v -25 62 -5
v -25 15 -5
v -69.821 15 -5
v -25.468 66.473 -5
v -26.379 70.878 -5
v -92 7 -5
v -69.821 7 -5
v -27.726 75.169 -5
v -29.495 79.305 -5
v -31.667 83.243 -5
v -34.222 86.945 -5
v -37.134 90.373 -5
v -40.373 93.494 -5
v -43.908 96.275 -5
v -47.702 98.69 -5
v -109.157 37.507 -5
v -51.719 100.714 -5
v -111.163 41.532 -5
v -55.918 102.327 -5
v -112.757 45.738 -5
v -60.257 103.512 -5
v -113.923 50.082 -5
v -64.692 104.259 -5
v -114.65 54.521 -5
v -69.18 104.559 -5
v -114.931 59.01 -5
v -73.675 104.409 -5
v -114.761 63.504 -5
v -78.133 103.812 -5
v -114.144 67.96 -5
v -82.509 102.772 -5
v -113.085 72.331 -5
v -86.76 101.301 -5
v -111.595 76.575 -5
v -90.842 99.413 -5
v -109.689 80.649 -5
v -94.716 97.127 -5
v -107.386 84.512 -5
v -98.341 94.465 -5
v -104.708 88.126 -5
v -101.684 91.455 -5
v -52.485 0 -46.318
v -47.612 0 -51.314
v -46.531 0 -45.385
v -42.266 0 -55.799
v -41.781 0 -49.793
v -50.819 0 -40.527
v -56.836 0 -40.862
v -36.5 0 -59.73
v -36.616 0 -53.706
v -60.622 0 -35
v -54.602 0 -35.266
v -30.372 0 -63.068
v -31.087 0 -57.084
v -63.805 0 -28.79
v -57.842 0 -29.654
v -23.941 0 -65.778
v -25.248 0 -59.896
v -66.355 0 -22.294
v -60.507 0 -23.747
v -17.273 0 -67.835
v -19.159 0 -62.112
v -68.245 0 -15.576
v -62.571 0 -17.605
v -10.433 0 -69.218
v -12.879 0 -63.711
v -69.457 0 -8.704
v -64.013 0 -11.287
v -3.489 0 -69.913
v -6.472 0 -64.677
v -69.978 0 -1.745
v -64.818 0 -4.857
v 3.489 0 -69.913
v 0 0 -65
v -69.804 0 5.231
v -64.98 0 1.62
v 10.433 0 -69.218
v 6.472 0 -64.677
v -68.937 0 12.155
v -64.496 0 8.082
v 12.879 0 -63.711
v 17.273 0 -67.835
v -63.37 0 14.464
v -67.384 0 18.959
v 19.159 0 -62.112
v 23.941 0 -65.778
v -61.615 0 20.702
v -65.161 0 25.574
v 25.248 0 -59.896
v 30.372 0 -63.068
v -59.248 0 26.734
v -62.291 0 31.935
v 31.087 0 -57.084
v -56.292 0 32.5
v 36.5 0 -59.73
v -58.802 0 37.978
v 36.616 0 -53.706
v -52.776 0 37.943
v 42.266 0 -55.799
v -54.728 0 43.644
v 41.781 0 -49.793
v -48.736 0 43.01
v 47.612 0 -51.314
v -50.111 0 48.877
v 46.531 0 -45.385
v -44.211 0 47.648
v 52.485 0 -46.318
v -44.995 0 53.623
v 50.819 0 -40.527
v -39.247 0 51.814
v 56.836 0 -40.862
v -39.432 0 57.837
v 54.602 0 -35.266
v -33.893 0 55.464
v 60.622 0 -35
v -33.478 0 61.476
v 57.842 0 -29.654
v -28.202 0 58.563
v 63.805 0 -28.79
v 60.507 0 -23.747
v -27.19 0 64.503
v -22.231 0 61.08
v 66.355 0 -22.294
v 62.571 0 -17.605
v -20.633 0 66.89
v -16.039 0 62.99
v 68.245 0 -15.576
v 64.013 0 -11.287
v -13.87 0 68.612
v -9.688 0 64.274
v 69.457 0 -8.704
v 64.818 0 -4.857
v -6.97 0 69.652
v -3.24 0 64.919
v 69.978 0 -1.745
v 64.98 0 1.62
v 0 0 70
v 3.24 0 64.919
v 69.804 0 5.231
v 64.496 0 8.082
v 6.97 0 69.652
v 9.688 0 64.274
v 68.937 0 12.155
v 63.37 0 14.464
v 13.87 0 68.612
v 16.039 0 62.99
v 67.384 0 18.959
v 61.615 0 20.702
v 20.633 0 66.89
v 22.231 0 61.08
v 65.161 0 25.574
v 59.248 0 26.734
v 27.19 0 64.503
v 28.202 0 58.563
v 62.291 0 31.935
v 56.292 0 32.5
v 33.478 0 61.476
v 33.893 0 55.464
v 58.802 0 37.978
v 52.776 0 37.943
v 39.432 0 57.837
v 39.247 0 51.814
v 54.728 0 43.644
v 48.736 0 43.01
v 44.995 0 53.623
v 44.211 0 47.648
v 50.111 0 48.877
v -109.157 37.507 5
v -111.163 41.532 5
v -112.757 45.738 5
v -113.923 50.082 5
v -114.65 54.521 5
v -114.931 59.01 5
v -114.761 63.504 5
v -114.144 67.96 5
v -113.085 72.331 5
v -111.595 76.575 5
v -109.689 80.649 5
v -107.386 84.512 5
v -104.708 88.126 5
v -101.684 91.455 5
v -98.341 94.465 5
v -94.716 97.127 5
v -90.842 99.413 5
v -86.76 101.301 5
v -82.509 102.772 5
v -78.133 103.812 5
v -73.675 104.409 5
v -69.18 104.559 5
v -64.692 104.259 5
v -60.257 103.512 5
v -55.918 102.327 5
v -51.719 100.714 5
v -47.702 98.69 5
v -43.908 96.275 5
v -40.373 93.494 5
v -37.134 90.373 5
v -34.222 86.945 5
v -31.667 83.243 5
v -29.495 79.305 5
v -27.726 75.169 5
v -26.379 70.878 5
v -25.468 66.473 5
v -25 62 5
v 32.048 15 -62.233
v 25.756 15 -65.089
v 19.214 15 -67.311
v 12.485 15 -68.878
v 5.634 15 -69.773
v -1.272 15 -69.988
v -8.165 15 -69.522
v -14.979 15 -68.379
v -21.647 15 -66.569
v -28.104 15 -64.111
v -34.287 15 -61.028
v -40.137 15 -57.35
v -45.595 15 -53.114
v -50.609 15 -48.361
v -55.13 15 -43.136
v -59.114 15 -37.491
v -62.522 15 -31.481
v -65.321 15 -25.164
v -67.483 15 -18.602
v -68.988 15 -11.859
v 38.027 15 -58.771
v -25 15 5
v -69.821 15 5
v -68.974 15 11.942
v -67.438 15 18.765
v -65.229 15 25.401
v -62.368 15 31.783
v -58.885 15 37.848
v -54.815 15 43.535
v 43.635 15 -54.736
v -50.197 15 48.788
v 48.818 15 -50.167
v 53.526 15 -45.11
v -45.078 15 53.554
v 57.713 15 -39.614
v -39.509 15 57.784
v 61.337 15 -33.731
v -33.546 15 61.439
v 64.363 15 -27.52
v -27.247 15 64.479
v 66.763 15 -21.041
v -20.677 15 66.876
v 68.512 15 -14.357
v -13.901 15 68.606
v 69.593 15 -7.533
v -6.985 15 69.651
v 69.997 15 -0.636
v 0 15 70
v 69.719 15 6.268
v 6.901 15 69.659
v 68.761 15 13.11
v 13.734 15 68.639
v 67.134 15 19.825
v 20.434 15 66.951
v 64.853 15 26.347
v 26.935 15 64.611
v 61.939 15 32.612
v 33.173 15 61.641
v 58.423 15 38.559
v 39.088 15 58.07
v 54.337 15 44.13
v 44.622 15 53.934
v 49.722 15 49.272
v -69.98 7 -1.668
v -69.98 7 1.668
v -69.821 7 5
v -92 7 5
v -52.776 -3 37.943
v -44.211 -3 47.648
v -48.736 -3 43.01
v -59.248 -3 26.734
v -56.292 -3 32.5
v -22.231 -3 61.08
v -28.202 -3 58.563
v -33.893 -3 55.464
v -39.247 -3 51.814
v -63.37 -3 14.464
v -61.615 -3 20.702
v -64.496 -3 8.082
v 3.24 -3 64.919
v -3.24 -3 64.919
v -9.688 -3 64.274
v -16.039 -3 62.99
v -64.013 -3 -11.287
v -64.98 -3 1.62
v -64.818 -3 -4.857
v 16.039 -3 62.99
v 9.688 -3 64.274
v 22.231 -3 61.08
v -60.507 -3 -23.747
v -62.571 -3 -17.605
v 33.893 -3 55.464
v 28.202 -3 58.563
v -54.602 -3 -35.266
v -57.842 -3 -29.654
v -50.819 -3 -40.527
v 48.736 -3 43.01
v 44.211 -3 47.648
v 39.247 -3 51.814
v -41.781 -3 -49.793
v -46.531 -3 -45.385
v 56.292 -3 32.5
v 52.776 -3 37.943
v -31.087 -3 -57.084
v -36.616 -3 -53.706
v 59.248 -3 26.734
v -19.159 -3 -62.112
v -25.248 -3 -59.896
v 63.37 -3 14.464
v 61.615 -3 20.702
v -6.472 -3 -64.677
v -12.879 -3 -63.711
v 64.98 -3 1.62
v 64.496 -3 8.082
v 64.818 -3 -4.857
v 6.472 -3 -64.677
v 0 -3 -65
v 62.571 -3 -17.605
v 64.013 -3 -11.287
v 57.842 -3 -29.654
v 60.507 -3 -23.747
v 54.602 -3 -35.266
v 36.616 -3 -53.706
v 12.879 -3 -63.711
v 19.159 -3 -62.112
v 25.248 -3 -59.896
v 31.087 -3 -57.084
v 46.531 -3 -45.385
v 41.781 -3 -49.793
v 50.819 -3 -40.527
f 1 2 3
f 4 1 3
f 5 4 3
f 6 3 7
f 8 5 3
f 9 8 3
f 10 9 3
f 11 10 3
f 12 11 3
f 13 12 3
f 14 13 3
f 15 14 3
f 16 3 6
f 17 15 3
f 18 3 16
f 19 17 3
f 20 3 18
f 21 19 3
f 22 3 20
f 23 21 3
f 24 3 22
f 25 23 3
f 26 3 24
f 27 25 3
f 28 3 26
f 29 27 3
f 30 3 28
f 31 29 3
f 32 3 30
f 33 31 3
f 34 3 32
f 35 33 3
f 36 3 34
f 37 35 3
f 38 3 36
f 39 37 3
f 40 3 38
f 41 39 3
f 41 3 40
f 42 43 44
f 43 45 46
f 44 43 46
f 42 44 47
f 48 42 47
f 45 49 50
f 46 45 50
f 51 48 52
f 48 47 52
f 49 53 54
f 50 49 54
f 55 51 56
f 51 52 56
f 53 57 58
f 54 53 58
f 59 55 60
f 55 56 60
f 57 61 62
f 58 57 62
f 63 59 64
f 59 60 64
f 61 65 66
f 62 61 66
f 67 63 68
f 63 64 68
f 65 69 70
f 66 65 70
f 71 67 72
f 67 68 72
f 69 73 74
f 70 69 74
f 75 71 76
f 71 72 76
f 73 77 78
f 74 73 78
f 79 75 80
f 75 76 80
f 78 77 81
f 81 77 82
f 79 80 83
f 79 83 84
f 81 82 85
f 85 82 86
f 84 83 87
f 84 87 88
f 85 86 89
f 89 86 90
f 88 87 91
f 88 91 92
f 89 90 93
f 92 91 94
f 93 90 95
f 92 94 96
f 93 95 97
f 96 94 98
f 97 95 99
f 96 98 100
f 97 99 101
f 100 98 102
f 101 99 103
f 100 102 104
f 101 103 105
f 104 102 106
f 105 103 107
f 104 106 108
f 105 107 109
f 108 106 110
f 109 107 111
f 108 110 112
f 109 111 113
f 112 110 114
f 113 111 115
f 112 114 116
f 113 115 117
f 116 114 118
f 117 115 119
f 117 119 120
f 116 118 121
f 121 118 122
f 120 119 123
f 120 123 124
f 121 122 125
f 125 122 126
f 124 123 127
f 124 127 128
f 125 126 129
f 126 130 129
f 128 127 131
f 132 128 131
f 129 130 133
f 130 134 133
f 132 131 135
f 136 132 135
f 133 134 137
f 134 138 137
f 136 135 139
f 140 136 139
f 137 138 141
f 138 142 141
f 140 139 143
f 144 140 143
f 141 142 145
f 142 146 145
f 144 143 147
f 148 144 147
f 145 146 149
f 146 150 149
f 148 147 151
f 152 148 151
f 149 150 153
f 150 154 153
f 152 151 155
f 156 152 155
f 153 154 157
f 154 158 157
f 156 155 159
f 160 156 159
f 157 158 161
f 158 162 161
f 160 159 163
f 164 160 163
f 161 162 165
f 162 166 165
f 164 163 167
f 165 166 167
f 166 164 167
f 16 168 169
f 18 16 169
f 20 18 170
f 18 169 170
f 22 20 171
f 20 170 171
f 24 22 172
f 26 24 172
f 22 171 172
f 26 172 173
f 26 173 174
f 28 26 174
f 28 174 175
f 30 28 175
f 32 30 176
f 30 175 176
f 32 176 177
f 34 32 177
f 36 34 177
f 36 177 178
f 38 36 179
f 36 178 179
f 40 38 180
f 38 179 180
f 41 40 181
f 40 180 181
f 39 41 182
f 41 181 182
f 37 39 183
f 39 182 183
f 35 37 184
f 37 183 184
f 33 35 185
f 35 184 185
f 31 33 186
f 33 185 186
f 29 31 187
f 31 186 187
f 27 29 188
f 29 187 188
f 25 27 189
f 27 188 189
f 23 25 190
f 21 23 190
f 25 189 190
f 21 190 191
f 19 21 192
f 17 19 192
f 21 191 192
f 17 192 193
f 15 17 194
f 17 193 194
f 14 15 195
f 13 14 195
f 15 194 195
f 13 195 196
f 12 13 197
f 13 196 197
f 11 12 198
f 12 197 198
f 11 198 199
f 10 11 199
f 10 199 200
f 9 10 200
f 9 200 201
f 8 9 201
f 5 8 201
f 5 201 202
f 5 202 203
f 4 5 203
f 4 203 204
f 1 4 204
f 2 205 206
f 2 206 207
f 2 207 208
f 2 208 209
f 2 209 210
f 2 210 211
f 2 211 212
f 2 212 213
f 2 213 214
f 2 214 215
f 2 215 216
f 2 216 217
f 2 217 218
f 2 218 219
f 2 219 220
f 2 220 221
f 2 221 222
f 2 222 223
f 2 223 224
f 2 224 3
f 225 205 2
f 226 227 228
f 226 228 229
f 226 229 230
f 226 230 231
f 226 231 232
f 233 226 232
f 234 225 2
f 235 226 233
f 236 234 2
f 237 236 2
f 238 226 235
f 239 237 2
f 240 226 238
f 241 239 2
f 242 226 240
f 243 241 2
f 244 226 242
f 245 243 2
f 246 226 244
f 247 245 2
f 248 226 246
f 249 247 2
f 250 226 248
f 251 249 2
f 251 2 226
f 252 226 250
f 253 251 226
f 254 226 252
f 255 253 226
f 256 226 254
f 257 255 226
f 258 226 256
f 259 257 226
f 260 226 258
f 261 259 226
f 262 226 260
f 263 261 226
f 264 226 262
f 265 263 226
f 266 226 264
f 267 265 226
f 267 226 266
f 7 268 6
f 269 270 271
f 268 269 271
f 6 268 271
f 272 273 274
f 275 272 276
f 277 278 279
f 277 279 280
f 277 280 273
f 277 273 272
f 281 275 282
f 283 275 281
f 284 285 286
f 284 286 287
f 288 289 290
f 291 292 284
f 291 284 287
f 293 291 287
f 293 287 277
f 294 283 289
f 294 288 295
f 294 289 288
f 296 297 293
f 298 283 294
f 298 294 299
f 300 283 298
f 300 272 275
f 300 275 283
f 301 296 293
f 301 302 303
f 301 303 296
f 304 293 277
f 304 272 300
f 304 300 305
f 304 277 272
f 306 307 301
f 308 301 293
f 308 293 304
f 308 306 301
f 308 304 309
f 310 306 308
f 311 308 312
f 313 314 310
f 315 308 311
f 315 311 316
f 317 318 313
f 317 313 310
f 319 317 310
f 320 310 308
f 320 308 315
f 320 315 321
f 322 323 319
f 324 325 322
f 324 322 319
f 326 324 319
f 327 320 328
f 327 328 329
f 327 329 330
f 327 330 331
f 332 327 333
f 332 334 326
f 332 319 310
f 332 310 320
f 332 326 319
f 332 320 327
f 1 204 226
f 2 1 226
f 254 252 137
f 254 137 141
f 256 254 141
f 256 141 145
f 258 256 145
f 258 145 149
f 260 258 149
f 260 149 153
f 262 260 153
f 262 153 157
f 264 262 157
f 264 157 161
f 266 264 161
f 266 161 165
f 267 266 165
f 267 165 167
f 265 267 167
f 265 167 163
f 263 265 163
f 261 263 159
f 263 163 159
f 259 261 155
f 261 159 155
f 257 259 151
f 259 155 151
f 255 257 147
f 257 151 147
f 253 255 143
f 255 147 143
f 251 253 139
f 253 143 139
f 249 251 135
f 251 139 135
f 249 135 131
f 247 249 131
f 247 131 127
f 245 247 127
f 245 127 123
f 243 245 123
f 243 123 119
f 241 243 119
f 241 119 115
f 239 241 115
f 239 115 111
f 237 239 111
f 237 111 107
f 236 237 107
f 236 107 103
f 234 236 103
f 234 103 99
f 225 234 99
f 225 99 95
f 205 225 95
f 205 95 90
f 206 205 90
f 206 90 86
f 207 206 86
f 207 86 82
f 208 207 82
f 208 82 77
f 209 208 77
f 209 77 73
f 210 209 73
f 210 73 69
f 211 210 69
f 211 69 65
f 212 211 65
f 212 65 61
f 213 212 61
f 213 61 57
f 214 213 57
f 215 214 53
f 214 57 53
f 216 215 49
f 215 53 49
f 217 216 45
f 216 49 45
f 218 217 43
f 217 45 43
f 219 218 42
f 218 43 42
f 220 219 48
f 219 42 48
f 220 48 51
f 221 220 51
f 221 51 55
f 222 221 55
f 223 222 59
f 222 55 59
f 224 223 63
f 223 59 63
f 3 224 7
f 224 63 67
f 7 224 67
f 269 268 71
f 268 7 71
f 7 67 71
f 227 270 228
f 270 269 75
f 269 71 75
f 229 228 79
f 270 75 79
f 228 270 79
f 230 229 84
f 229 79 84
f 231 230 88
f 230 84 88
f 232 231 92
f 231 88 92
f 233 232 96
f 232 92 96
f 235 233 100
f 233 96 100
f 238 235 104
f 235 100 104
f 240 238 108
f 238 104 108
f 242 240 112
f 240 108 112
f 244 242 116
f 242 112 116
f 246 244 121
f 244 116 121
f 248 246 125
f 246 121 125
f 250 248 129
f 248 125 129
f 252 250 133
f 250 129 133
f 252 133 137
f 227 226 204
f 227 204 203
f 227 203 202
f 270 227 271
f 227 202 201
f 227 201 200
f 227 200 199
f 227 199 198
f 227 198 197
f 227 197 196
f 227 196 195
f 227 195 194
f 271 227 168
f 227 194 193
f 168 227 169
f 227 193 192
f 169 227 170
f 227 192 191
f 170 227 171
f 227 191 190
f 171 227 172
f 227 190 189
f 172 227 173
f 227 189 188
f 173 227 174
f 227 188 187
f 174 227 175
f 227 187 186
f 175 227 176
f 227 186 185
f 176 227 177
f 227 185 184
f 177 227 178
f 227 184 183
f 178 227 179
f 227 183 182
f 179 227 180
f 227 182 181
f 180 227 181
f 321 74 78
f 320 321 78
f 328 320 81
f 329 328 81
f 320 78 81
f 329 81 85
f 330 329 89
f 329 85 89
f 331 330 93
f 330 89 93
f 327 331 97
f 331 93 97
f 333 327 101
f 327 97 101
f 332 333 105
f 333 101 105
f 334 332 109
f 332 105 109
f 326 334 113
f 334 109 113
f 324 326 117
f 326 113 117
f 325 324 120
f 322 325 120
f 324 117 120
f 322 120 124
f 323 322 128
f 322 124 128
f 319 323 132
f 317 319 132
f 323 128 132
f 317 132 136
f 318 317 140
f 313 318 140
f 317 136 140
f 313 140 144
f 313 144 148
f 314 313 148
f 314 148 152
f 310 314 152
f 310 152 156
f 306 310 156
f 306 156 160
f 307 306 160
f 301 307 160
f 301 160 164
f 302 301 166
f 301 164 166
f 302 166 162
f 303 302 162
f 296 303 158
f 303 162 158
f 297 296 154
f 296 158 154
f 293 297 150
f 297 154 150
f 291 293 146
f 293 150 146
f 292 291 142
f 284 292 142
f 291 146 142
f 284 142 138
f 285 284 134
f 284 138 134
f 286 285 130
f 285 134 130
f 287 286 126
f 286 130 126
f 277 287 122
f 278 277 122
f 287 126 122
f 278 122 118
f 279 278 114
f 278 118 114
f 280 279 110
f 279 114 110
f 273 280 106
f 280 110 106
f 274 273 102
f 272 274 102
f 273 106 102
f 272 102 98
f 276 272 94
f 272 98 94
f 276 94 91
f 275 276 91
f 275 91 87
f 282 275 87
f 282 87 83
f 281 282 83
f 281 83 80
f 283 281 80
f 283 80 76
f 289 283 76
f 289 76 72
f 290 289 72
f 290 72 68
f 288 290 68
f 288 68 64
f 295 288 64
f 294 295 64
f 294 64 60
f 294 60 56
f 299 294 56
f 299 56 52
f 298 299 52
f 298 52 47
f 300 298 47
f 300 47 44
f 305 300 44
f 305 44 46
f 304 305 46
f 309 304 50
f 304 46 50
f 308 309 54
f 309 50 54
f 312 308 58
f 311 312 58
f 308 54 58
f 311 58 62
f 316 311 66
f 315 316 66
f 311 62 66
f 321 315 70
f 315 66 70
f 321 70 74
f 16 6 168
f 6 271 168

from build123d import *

# Parameters (mm, degrees)
SKETCH1_R           = 70
BOSS_EXTRUDE2_DEPTH = 15
SKETCH2_R           = 65
BOSS_EXTRUDE3_DEPTH = 3
BOSS_EXTRUDE4_DEPTH = 5


with BuildPart() as part:
    # Sketch1 → Boss-Extrude2 (new body)
    with BuildSketch(Plane(origin=(0, 0, 0), x_dir=(1, 0, 0), z_dir=(0, 1, 0))):
        with Locations(Location((0, 0, 0), (0, 0, 270))):
            Circle(SKETCH1_R)
    extrude(amount=BOSS_EXTRUDE2_DEPTH)

    # Sketch2 → Boss-Extrude3 (add)
    with BuildSketch(Plane.XZ):
        with Locations(Location((0, 0, 0), (0, 0, 270))):
            Circle(SKETCH2_R)
    extrude(amount=BOSS_EXTRUDE3_DEPTH)

    # Sketch3 → Boss-Extrude4 (add, symmetric)
    with BuildSketch(Plane.XY):
        with BuildLine():
            Line((-25, 62), (-25, 7))
            Line((-25, 7), (-92, 7))
            Line((-92, 7), (-109.156726544, 37.506503148))
            ThreePointArc((-109.156726544, 37.506503148), (-82.509371405, 102.772350464), (-25, 62))
        make_face()
    extrude(amount=BOSS_EXTRUDE4_DEPTH, both=True)


solid = part.part
